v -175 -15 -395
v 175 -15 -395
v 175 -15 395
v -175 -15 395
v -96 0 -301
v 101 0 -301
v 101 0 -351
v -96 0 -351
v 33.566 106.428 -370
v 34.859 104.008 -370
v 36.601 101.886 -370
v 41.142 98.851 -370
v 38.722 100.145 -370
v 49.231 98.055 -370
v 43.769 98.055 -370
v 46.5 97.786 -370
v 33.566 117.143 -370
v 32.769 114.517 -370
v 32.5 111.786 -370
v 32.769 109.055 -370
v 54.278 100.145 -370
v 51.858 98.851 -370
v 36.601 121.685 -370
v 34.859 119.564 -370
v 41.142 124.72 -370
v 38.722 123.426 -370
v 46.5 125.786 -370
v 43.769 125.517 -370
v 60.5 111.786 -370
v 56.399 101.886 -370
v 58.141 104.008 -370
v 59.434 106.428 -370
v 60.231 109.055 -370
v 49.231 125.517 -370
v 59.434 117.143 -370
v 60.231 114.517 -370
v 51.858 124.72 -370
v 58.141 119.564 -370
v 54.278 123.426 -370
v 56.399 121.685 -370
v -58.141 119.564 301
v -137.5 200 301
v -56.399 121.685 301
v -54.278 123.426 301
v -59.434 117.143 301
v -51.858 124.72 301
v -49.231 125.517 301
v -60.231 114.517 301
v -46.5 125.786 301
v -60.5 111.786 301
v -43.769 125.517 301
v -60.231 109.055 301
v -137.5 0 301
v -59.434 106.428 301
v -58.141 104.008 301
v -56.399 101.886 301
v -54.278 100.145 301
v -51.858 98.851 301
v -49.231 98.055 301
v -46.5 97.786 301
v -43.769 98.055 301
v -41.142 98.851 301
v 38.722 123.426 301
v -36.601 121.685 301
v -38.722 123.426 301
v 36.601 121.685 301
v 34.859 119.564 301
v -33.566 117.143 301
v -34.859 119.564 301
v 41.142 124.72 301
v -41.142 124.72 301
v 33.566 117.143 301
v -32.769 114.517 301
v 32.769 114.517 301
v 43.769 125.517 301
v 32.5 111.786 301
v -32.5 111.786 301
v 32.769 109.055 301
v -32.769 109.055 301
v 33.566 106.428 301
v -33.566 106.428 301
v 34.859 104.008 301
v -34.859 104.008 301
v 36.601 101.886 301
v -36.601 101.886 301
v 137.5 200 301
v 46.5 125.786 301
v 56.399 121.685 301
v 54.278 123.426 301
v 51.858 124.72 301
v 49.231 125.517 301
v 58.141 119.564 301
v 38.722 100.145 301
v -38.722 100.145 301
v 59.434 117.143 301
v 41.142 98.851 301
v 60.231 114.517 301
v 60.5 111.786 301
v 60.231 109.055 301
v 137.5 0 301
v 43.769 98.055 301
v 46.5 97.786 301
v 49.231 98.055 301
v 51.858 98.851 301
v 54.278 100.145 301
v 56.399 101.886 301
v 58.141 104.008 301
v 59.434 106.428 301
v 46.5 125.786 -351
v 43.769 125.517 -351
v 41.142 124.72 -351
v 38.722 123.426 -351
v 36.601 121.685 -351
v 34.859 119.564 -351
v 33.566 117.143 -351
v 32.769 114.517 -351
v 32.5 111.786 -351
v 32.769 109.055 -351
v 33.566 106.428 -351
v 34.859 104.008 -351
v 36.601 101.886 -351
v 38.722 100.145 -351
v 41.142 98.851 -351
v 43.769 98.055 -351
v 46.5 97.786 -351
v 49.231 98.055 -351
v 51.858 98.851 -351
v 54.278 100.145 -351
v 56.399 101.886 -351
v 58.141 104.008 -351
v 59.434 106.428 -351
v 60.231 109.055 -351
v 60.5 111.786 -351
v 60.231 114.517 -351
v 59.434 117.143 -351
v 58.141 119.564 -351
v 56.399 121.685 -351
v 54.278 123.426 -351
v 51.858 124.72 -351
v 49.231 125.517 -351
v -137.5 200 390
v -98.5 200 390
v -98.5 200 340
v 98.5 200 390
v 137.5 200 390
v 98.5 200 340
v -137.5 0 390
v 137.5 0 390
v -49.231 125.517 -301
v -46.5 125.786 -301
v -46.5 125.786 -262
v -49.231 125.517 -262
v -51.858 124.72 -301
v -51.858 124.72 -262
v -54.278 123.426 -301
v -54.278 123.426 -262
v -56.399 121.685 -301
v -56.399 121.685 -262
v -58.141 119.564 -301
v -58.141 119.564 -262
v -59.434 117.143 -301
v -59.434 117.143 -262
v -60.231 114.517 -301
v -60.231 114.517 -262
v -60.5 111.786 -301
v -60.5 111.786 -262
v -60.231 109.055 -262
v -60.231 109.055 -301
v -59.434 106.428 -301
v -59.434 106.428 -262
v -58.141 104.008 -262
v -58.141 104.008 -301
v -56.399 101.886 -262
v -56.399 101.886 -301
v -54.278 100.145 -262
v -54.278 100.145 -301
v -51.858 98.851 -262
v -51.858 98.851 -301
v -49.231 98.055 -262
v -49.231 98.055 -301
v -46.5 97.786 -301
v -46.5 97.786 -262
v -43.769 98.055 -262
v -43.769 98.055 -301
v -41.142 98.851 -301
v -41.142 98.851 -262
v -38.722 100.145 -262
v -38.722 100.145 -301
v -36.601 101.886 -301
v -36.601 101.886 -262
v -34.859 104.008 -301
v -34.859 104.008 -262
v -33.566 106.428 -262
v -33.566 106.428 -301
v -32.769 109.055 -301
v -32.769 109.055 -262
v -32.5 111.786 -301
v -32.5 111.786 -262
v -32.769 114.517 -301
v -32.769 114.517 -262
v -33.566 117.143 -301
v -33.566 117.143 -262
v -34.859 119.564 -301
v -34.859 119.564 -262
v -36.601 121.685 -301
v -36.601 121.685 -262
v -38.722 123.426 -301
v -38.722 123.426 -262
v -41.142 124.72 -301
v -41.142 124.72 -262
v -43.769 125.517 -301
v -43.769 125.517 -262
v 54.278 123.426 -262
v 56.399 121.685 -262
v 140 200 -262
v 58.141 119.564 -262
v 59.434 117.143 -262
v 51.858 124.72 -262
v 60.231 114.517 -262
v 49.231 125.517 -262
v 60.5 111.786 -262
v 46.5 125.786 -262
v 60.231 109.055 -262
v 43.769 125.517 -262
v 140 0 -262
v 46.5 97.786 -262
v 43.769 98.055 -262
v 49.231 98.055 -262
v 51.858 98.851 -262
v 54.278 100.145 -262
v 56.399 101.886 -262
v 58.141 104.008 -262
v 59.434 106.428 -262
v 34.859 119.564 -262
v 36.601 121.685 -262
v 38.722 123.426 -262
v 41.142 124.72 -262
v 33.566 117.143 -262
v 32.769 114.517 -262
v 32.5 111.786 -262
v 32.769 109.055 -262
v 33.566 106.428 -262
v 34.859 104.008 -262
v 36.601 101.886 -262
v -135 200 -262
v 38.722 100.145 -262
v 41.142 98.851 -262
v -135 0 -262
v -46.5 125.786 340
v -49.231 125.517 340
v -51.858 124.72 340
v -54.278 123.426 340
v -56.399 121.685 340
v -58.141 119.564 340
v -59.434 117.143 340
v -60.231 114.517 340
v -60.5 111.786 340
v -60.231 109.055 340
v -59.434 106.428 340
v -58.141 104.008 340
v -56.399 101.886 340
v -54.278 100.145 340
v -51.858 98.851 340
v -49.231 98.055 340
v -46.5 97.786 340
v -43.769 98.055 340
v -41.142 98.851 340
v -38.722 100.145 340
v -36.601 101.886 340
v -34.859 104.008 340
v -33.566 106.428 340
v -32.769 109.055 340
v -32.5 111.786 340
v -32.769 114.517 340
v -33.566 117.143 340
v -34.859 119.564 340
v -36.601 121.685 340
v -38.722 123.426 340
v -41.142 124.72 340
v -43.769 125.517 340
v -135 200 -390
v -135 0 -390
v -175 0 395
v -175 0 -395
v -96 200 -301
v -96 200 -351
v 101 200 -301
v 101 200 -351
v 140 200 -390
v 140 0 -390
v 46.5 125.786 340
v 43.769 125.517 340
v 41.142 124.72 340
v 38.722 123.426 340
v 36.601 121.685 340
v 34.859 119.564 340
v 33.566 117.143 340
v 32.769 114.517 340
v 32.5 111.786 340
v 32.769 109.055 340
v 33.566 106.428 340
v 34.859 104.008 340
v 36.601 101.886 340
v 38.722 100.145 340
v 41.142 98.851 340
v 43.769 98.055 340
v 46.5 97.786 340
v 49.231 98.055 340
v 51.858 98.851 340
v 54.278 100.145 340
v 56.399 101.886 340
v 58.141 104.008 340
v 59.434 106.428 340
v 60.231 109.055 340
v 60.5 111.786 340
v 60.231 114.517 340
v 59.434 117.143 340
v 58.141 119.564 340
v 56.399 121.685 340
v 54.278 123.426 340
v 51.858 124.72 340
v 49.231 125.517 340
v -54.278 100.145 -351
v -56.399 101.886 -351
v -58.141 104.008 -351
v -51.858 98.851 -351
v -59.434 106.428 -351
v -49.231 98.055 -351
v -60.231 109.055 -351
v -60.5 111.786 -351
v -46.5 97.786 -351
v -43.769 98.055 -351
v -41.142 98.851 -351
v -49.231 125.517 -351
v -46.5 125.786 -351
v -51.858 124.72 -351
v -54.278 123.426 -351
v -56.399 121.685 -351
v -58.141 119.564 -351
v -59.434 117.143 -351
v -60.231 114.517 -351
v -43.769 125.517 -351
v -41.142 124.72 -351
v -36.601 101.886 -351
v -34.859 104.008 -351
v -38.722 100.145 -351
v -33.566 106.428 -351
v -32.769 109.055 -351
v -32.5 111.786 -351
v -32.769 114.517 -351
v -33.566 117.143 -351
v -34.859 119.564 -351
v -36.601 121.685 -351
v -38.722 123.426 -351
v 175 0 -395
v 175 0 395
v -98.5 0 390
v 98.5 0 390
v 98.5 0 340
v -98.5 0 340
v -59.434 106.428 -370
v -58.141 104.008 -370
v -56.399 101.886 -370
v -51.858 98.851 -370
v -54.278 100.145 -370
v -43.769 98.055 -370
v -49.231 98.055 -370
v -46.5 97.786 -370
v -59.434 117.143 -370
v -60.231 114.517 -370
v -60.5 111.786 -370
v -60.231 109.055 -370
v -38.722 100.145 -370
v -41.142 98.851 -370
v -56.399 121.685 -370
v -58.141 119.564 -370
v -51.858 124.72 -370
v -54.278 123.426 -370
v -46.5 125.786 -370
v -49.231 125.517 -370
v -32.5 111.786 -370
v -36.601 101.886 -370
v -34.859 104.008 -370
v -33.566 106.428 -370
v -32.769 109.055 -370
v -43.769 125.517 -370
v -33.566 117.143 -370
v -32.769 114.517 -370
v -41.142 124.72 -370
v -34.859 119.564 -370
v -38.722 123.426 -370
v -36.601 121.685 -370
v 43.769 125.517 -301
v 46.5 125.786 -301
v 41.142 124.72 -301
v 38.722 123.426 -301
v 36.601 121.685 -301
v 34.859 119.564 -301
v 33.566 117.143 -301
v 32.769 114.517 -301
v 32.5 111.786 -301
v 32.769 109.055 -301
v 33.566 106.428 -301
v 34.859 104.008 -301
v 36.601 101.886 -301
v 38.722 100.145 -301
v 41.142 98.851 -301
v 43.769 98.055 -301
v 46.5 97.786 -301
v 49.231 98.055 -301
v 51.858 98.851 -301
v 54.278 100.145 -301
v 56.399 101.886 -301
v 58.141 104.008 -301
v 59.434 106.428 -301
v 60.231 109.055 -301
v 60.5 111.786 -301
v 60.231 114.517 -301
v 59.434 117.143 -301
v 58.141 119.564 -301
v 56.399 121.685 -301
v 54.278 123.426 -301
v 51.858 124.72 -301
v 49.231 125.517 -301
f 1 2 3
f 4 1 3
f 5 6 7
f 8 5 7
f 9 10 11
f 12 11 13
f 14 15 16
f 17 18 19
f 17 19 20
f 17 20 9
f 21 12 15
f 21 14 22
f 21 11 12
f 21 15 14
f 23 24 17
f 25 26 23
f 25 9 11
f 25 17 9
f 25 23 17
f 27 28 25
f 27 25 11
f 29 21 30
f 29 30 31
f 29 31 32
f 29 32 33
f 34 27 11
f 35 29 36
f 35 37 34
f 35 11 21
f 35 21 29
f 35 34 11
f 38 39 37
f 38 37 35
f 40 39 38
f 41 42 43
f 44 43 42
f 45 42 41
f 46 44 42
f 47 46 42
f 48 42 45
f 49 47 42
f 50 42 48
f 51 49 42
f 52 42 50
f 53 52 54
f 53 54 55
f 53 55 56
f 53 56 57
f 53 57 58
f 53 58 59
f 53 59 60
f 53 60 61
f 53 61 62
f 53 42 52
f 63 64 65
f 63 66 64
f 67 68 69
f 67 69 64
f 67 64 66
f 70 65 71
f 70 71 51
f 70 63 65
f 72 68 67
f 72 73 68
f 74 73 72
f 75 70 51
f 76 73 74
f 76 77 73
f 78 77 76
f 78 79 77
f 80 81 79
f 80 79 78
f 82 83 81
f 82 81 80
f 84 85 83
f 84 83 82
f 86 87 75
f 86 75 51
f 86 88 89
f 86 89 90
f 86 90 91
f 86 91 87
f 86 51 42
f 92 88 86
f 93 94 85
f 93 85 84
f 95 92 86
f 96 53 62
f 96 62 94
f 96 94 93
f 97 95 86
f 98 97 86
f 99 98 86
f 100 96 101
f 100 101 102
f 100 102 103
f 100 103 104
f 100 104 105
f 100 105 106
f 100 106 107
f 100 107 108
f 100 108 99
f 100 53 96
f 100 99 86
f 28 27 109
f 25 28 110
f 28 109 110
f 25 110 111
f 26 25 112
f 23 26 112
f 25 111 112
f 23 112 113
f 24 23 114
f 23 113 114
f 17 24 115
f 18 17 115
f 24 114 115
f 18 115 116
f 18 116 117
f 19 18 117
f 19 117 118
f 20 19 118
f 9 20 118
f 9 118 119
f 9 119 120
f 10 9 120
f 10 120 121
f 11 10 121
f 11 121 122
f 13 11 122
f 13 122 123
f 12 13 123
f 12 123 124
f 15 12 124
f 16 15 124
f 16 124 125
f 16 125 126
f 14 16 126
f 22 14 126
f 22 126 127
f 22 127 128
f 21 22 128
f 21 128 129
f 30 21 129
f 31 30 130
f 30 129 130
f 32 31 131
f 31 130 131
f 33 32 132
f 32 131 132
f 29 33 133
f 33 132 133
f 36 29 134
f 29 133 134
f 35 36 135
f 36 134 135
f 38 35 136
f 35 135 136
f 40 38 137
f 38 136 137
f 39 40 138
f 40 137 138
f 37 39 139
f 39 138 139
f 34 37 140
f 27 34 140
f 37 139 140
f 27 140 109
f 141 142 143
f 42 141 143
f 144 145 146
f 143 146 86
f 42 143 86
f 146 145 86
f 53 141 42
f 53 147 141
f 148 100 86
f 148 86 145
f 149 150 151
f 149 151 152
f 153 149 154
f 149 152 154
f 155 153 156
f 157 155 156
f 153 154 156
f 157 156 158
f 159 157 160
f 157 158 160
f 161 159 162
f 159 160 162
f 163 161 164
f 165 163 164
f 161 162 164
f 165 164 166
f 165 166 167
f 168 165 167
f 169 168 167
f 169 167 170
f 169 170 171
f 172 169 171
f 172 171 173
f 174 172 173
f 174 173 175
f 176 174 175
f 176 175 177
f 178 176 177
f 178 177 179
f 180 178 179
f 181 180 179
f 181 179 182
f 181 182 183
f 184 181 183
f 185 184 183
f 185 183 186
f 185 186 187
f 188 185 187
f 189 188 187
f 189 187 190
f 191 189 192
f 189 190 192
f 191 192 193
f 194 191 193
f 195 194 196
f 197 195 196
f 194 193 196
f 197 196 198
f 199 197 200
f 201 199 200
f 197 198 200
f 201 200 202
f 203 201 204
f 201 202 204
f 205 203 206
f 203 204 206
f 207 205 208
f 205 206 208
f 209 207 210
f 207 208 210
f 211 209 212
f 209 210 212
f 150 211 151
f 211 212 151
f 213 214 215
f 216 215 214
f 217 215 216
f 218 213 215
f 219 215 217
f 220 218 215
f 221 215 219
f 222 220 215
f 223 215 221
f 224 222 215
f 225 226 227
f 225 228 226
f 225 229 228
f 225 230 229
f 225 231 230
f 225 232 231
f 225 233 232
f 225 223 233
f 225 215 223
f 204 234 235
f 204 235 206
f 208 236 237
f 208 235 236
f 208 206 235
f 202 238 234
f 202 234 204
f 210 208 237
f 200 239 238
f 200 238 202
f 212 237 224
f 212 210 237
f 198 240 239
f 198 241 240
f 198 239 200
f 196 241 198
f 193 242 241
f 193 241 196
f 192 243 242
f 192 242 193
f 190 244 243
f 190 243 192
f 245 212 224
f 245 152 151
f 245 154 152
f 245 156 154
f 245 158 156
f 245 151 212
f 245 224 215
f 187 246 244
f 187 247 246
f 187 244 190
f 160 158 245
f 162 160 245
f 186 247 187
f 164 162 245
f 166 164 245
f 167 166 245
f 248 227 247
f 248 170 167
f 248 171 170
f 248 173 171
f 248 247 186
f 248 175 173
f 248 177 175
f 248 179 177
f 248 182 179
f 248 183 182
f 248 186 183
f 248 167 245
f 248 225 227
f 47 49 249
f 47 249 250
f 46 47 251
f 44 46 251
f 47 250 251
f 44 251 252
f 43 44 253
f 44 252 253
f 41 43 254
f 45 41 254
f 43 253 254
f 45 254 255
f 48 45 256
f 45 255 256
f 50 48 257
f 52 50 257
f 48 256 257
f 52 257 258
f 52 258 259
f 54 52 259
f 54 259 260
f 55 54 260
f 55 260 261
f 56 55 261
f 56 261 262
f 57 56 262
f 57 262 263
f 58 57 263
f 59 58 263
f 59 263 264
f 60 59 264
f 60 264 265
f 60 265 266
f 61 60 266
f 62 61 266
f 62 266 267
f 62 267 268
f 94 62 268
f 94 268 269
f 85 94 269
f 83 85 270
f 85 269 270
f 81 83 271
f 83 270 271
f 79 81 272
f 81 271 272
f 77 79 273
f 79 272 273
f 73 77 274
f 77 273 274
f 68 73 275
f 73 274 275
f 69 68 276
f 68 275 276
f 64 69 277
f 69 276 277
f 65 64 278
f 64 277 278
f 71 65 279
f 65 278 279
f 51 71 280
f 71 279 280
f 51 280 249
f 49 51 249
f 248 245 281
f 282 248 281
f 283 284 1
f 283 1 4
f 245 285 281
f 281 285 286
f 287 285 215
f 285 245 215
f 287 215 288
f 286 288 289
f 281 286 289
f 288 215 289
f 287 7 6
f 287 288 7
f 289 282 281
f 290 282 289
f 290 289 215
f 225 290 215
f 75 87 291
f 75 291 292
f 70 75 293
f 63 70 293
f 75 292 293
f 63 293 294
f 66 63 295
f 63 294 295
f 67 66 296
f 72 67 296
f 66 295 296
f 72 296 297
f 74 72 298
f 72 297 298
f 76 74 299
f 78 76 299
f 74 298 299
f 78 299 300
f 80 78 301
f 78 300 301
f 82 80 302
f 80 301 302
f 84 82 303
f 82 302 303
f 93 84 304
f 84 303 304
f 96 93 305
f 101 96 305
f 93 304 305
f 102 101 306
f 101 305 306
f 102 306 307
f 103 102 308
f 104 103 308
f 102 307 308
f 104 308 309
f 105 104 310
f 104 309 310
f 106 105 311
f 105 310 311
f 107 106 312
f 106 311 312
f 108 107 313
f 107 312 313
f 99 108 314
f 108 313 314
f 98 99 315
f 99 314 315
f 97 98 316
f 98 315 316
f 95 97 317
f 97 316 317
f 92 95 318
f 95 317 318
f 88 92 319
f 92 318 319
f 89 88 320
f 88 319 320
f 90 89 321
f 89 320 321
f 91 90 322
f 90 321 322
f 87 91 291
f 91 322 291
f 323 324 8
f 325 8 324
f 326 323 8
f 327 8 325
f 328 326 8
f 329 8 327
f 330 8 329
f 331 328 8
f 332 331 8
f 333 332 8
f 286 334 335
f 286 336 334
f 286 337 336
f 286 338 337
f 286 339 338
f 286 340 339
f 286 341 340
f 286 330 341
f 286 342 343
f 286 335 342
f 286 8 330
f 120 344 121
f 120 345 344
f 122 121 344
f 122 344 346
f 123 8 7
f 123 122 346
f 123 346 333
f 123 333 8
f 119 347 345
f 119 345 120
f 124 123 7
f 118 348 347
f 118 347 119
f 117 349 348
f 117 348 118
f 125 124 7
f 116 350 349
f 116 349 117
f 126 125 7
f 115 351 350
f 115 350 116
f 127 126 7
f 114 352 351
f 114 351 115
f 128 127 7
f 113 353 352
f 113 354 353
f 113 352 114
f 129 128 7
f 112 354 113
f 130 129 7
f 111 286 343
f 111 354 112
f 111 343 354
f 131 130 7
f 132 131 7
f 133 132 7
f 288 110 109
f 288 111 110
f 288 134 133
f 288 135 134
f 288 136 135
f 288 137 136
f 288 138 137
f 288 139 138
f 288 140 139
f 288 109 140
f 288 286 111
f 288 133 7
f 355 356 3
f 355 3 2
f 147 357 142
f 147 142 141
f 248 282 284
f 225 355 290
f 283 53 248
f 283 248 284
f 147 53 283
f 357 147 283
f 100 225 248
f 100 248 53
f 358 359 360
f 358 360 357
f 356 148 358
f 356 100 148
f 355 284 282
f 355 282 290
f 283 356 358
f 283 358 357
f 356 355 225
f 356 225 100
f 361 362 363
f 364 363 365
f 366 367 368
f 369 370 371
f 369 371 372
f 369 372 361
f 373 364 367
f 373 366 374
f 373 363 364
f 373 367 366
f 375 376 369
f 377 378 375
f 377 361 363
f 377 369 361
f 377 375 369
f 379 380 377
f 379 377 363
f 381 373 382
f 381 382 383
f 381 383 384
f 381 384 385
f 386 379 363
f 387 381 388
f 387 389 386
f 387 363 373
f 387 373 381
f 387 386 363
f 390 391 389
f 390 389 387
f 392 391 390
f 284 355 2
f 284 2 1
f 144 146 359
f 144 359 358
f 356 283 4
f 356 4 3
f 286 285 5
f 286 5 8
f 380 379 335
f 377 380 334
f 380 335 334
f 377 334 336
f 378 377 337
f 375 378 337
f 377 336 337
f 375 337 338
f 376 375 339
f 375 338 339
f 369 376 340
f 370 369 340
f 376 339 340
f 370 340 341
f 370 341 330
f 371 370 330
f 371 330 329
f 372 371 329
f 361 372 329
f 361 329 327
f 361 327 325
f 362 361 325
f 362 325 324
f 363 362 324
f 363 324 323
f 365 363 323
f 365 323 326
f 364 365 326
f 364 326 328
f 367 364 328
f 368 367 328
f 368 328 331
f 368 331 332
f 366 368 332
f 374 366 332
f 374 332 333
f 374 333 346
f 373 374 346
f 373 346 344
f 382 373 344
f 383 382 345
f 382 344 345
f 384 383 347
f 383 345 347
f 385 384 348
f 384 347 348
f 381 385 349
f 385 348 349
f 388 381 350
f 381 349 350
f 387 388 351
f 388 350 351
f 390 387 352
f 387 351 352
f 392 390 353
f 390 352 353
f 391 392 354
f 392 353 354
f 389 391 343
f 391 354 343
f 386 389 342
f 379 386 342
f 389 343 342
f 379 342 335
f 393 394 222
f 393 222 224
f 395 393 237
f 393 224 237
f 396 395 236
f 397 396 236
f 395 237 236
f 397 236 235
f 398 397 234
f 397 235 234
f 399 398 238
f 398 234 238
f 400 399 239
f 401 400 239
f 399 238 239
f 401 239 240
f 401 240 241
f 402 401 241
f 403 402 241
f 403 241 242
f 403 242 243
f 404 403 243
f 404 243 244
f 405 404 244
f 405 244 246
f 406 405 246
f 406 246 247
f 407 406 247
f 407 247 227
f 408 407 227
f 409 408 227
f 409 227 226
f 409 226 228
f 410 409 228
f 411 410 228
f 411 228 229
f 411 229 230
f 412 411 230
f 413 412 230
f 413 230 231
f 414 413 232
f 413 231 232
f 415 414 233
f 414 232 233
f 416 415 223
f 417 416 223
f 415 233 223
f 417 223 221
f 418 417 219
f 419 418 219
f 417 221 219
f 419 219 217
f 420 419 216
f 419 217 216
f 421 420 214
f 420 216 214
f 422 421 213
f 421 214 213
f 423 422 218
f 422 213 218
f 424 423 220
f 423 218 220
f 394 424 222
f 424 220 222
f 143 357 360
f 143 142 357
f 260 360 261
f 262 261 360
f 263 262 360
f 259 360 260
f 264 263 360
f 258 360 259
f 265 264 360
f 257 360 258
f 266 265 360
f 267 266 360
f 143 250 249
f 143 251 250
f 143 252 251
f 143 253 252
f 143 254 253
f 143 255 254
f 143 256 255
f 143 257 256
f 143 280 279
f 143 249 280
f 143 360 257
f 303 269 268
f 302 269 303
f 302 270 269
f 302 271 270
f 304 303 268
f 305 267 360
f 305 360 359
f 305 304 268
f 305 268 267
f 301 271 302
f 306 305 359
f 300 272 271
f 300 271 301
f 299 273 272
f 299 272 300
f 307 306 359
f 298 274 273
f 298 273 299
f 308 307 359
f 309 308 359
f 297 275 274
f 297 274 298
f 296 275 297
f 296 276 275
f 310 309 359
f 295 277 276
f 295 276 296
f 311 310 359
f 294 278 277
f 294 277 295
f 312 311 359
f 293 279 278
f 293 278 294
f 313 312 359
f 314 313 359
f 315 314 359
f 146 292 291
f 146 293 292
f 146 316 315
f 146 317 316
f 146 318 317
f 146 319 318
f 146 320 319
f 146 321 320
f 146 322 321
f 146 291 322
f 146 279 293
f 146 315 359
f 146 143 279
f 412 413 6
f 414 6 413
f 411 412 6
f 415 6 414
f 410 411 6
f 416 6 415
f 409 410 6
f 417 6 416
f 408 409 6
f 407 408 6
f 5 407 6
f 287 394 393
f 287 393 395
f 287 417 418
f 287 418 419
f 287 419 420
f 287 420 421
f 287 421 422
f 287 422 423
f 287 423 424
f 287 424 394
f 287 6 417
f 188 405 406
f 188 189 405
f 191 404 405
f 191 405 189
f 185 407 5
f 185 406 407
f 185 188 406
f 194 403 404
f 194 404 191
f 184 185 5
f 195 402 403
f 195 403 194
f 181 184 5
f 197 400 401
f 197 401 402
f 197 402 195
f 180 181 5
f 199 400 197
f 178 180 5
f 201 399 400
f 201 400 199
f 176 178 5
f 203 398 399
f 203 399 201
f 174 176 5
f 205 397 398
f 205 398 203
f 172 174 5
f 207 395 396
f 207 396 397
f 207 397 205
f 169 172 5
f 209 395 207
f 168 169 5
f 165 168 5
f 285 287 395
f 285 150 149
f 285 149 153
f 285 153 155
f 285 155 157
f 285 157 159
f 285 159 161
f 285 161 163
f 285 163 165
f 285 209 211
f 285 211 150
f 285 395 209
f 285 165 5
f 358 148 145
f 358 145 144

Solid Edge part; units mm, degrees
sketch "Sketch1" plane through (0, 0, 0) normal (0, 1, 0) x (-1, 0, 0)
  line L0 (-175, -395) -> (175, -395)
  line L1 (175, -395) -> (175, 395)
  line L2 (175, 395) -> (-175, 395)
  line L3 (-175, 395) -> (-175, -395)
  dimension "D1" = 350
  dimension "D2" = 790
extrude "Protrusion1" add sketch "Sketch1" against normal blind 15
sketch "Sketch2" plane through (0, 0, 0) normal (0, 1, 0) x (0, 0, -1)
  line L0 (-390, 137.5) -> (-301, 137.5)
  line L1 (-301, 137.5) -> (-301, -137.5)
  line L2 (-301, -137.5) -> (-390, -137.5)
  line L3 (-390, -137.5) -> (-390, 137.5)
  dimension "D1" = 89
  dimension "D2" = 275
  dimension "D3" = 5
  dimension "D4" = 37.5
extrude "ExtrudedProtrusion_4" add sketch "Sketch2" along normal blind 200
sketch "Sketch3" plane through (0, 0, 0) normal (0, 1, 0) x (0, 0, -1)
  line L0 (262, 135) -> (390, 135)
  line L1 (390, 135) -> (390, -140)
  line L2 (390, -140) -> (262, -140)
  line L3 (262, -140) -> (262, 135)
  dimension "D1" = 128
  dimension "D2" = 275
  dimension "D3" = 35
  dimension "D4" = 5
extrude "ExtrudedProtrusion_5" add sketch "Sketch3" along normal blind 200
sketch "Sketch4" plane through (0, 200, 355.5) normal (0, 1, 0) x (0, 0, -1)
  line L0 (-34.5, 98.5) -> (15.5, 98.5)
  line L1 (15.5, 98.5) -> (15.5, -98.5)
  line L2 (15.5, -98.5) -> (-34.5, -98.5)
  line L3 (-34.5, -98.5) -> (-34.5, 98.5)
  dimension "D1" = 39
  dimension "D2" = 39
  dimension "D3" = 39
extrude "ExtrudedCutout_1" cut sketch "Sketch4" against normal blind 200
sketch "Sketch5" plane through (2.5, 200, -355.5) normal (0, 1, 0) x (0, 0, -1)
  line L0 (-54.5, 98.5) -> (-4.5, 98.5)
  line L1 (-4.5, 98.5) -> (-4.5, -98.5)
  line L2 (-4.5, -98.5) -> (-54.5, -98.5)
  line L3 (-54.5, -98.5) -> (-54.5, 98.5)
  dimension "D1" = 50
  dimension "D2" = 39
  dimension "D3" = 39
  dimension "D4" = 39
extrude "ExtrudedCutout_2" cut sketch "Sketch5" against normal blind 200
sketch "Sketch6" plane through (0, 100, 340) normal (0, 0, 1) x (0, 1, 0)
  circle A0 centre (11.7858, -46.5) radius 14
  circle A1 centre (11.7858, 46.5) radius 14
  dimension "D1" = 93
  dimension "D2" = 52
  dimension "D3" = 28
extrude "ExtrudedCutout_5" cut sketch "Sketch6" against normal blind 710
